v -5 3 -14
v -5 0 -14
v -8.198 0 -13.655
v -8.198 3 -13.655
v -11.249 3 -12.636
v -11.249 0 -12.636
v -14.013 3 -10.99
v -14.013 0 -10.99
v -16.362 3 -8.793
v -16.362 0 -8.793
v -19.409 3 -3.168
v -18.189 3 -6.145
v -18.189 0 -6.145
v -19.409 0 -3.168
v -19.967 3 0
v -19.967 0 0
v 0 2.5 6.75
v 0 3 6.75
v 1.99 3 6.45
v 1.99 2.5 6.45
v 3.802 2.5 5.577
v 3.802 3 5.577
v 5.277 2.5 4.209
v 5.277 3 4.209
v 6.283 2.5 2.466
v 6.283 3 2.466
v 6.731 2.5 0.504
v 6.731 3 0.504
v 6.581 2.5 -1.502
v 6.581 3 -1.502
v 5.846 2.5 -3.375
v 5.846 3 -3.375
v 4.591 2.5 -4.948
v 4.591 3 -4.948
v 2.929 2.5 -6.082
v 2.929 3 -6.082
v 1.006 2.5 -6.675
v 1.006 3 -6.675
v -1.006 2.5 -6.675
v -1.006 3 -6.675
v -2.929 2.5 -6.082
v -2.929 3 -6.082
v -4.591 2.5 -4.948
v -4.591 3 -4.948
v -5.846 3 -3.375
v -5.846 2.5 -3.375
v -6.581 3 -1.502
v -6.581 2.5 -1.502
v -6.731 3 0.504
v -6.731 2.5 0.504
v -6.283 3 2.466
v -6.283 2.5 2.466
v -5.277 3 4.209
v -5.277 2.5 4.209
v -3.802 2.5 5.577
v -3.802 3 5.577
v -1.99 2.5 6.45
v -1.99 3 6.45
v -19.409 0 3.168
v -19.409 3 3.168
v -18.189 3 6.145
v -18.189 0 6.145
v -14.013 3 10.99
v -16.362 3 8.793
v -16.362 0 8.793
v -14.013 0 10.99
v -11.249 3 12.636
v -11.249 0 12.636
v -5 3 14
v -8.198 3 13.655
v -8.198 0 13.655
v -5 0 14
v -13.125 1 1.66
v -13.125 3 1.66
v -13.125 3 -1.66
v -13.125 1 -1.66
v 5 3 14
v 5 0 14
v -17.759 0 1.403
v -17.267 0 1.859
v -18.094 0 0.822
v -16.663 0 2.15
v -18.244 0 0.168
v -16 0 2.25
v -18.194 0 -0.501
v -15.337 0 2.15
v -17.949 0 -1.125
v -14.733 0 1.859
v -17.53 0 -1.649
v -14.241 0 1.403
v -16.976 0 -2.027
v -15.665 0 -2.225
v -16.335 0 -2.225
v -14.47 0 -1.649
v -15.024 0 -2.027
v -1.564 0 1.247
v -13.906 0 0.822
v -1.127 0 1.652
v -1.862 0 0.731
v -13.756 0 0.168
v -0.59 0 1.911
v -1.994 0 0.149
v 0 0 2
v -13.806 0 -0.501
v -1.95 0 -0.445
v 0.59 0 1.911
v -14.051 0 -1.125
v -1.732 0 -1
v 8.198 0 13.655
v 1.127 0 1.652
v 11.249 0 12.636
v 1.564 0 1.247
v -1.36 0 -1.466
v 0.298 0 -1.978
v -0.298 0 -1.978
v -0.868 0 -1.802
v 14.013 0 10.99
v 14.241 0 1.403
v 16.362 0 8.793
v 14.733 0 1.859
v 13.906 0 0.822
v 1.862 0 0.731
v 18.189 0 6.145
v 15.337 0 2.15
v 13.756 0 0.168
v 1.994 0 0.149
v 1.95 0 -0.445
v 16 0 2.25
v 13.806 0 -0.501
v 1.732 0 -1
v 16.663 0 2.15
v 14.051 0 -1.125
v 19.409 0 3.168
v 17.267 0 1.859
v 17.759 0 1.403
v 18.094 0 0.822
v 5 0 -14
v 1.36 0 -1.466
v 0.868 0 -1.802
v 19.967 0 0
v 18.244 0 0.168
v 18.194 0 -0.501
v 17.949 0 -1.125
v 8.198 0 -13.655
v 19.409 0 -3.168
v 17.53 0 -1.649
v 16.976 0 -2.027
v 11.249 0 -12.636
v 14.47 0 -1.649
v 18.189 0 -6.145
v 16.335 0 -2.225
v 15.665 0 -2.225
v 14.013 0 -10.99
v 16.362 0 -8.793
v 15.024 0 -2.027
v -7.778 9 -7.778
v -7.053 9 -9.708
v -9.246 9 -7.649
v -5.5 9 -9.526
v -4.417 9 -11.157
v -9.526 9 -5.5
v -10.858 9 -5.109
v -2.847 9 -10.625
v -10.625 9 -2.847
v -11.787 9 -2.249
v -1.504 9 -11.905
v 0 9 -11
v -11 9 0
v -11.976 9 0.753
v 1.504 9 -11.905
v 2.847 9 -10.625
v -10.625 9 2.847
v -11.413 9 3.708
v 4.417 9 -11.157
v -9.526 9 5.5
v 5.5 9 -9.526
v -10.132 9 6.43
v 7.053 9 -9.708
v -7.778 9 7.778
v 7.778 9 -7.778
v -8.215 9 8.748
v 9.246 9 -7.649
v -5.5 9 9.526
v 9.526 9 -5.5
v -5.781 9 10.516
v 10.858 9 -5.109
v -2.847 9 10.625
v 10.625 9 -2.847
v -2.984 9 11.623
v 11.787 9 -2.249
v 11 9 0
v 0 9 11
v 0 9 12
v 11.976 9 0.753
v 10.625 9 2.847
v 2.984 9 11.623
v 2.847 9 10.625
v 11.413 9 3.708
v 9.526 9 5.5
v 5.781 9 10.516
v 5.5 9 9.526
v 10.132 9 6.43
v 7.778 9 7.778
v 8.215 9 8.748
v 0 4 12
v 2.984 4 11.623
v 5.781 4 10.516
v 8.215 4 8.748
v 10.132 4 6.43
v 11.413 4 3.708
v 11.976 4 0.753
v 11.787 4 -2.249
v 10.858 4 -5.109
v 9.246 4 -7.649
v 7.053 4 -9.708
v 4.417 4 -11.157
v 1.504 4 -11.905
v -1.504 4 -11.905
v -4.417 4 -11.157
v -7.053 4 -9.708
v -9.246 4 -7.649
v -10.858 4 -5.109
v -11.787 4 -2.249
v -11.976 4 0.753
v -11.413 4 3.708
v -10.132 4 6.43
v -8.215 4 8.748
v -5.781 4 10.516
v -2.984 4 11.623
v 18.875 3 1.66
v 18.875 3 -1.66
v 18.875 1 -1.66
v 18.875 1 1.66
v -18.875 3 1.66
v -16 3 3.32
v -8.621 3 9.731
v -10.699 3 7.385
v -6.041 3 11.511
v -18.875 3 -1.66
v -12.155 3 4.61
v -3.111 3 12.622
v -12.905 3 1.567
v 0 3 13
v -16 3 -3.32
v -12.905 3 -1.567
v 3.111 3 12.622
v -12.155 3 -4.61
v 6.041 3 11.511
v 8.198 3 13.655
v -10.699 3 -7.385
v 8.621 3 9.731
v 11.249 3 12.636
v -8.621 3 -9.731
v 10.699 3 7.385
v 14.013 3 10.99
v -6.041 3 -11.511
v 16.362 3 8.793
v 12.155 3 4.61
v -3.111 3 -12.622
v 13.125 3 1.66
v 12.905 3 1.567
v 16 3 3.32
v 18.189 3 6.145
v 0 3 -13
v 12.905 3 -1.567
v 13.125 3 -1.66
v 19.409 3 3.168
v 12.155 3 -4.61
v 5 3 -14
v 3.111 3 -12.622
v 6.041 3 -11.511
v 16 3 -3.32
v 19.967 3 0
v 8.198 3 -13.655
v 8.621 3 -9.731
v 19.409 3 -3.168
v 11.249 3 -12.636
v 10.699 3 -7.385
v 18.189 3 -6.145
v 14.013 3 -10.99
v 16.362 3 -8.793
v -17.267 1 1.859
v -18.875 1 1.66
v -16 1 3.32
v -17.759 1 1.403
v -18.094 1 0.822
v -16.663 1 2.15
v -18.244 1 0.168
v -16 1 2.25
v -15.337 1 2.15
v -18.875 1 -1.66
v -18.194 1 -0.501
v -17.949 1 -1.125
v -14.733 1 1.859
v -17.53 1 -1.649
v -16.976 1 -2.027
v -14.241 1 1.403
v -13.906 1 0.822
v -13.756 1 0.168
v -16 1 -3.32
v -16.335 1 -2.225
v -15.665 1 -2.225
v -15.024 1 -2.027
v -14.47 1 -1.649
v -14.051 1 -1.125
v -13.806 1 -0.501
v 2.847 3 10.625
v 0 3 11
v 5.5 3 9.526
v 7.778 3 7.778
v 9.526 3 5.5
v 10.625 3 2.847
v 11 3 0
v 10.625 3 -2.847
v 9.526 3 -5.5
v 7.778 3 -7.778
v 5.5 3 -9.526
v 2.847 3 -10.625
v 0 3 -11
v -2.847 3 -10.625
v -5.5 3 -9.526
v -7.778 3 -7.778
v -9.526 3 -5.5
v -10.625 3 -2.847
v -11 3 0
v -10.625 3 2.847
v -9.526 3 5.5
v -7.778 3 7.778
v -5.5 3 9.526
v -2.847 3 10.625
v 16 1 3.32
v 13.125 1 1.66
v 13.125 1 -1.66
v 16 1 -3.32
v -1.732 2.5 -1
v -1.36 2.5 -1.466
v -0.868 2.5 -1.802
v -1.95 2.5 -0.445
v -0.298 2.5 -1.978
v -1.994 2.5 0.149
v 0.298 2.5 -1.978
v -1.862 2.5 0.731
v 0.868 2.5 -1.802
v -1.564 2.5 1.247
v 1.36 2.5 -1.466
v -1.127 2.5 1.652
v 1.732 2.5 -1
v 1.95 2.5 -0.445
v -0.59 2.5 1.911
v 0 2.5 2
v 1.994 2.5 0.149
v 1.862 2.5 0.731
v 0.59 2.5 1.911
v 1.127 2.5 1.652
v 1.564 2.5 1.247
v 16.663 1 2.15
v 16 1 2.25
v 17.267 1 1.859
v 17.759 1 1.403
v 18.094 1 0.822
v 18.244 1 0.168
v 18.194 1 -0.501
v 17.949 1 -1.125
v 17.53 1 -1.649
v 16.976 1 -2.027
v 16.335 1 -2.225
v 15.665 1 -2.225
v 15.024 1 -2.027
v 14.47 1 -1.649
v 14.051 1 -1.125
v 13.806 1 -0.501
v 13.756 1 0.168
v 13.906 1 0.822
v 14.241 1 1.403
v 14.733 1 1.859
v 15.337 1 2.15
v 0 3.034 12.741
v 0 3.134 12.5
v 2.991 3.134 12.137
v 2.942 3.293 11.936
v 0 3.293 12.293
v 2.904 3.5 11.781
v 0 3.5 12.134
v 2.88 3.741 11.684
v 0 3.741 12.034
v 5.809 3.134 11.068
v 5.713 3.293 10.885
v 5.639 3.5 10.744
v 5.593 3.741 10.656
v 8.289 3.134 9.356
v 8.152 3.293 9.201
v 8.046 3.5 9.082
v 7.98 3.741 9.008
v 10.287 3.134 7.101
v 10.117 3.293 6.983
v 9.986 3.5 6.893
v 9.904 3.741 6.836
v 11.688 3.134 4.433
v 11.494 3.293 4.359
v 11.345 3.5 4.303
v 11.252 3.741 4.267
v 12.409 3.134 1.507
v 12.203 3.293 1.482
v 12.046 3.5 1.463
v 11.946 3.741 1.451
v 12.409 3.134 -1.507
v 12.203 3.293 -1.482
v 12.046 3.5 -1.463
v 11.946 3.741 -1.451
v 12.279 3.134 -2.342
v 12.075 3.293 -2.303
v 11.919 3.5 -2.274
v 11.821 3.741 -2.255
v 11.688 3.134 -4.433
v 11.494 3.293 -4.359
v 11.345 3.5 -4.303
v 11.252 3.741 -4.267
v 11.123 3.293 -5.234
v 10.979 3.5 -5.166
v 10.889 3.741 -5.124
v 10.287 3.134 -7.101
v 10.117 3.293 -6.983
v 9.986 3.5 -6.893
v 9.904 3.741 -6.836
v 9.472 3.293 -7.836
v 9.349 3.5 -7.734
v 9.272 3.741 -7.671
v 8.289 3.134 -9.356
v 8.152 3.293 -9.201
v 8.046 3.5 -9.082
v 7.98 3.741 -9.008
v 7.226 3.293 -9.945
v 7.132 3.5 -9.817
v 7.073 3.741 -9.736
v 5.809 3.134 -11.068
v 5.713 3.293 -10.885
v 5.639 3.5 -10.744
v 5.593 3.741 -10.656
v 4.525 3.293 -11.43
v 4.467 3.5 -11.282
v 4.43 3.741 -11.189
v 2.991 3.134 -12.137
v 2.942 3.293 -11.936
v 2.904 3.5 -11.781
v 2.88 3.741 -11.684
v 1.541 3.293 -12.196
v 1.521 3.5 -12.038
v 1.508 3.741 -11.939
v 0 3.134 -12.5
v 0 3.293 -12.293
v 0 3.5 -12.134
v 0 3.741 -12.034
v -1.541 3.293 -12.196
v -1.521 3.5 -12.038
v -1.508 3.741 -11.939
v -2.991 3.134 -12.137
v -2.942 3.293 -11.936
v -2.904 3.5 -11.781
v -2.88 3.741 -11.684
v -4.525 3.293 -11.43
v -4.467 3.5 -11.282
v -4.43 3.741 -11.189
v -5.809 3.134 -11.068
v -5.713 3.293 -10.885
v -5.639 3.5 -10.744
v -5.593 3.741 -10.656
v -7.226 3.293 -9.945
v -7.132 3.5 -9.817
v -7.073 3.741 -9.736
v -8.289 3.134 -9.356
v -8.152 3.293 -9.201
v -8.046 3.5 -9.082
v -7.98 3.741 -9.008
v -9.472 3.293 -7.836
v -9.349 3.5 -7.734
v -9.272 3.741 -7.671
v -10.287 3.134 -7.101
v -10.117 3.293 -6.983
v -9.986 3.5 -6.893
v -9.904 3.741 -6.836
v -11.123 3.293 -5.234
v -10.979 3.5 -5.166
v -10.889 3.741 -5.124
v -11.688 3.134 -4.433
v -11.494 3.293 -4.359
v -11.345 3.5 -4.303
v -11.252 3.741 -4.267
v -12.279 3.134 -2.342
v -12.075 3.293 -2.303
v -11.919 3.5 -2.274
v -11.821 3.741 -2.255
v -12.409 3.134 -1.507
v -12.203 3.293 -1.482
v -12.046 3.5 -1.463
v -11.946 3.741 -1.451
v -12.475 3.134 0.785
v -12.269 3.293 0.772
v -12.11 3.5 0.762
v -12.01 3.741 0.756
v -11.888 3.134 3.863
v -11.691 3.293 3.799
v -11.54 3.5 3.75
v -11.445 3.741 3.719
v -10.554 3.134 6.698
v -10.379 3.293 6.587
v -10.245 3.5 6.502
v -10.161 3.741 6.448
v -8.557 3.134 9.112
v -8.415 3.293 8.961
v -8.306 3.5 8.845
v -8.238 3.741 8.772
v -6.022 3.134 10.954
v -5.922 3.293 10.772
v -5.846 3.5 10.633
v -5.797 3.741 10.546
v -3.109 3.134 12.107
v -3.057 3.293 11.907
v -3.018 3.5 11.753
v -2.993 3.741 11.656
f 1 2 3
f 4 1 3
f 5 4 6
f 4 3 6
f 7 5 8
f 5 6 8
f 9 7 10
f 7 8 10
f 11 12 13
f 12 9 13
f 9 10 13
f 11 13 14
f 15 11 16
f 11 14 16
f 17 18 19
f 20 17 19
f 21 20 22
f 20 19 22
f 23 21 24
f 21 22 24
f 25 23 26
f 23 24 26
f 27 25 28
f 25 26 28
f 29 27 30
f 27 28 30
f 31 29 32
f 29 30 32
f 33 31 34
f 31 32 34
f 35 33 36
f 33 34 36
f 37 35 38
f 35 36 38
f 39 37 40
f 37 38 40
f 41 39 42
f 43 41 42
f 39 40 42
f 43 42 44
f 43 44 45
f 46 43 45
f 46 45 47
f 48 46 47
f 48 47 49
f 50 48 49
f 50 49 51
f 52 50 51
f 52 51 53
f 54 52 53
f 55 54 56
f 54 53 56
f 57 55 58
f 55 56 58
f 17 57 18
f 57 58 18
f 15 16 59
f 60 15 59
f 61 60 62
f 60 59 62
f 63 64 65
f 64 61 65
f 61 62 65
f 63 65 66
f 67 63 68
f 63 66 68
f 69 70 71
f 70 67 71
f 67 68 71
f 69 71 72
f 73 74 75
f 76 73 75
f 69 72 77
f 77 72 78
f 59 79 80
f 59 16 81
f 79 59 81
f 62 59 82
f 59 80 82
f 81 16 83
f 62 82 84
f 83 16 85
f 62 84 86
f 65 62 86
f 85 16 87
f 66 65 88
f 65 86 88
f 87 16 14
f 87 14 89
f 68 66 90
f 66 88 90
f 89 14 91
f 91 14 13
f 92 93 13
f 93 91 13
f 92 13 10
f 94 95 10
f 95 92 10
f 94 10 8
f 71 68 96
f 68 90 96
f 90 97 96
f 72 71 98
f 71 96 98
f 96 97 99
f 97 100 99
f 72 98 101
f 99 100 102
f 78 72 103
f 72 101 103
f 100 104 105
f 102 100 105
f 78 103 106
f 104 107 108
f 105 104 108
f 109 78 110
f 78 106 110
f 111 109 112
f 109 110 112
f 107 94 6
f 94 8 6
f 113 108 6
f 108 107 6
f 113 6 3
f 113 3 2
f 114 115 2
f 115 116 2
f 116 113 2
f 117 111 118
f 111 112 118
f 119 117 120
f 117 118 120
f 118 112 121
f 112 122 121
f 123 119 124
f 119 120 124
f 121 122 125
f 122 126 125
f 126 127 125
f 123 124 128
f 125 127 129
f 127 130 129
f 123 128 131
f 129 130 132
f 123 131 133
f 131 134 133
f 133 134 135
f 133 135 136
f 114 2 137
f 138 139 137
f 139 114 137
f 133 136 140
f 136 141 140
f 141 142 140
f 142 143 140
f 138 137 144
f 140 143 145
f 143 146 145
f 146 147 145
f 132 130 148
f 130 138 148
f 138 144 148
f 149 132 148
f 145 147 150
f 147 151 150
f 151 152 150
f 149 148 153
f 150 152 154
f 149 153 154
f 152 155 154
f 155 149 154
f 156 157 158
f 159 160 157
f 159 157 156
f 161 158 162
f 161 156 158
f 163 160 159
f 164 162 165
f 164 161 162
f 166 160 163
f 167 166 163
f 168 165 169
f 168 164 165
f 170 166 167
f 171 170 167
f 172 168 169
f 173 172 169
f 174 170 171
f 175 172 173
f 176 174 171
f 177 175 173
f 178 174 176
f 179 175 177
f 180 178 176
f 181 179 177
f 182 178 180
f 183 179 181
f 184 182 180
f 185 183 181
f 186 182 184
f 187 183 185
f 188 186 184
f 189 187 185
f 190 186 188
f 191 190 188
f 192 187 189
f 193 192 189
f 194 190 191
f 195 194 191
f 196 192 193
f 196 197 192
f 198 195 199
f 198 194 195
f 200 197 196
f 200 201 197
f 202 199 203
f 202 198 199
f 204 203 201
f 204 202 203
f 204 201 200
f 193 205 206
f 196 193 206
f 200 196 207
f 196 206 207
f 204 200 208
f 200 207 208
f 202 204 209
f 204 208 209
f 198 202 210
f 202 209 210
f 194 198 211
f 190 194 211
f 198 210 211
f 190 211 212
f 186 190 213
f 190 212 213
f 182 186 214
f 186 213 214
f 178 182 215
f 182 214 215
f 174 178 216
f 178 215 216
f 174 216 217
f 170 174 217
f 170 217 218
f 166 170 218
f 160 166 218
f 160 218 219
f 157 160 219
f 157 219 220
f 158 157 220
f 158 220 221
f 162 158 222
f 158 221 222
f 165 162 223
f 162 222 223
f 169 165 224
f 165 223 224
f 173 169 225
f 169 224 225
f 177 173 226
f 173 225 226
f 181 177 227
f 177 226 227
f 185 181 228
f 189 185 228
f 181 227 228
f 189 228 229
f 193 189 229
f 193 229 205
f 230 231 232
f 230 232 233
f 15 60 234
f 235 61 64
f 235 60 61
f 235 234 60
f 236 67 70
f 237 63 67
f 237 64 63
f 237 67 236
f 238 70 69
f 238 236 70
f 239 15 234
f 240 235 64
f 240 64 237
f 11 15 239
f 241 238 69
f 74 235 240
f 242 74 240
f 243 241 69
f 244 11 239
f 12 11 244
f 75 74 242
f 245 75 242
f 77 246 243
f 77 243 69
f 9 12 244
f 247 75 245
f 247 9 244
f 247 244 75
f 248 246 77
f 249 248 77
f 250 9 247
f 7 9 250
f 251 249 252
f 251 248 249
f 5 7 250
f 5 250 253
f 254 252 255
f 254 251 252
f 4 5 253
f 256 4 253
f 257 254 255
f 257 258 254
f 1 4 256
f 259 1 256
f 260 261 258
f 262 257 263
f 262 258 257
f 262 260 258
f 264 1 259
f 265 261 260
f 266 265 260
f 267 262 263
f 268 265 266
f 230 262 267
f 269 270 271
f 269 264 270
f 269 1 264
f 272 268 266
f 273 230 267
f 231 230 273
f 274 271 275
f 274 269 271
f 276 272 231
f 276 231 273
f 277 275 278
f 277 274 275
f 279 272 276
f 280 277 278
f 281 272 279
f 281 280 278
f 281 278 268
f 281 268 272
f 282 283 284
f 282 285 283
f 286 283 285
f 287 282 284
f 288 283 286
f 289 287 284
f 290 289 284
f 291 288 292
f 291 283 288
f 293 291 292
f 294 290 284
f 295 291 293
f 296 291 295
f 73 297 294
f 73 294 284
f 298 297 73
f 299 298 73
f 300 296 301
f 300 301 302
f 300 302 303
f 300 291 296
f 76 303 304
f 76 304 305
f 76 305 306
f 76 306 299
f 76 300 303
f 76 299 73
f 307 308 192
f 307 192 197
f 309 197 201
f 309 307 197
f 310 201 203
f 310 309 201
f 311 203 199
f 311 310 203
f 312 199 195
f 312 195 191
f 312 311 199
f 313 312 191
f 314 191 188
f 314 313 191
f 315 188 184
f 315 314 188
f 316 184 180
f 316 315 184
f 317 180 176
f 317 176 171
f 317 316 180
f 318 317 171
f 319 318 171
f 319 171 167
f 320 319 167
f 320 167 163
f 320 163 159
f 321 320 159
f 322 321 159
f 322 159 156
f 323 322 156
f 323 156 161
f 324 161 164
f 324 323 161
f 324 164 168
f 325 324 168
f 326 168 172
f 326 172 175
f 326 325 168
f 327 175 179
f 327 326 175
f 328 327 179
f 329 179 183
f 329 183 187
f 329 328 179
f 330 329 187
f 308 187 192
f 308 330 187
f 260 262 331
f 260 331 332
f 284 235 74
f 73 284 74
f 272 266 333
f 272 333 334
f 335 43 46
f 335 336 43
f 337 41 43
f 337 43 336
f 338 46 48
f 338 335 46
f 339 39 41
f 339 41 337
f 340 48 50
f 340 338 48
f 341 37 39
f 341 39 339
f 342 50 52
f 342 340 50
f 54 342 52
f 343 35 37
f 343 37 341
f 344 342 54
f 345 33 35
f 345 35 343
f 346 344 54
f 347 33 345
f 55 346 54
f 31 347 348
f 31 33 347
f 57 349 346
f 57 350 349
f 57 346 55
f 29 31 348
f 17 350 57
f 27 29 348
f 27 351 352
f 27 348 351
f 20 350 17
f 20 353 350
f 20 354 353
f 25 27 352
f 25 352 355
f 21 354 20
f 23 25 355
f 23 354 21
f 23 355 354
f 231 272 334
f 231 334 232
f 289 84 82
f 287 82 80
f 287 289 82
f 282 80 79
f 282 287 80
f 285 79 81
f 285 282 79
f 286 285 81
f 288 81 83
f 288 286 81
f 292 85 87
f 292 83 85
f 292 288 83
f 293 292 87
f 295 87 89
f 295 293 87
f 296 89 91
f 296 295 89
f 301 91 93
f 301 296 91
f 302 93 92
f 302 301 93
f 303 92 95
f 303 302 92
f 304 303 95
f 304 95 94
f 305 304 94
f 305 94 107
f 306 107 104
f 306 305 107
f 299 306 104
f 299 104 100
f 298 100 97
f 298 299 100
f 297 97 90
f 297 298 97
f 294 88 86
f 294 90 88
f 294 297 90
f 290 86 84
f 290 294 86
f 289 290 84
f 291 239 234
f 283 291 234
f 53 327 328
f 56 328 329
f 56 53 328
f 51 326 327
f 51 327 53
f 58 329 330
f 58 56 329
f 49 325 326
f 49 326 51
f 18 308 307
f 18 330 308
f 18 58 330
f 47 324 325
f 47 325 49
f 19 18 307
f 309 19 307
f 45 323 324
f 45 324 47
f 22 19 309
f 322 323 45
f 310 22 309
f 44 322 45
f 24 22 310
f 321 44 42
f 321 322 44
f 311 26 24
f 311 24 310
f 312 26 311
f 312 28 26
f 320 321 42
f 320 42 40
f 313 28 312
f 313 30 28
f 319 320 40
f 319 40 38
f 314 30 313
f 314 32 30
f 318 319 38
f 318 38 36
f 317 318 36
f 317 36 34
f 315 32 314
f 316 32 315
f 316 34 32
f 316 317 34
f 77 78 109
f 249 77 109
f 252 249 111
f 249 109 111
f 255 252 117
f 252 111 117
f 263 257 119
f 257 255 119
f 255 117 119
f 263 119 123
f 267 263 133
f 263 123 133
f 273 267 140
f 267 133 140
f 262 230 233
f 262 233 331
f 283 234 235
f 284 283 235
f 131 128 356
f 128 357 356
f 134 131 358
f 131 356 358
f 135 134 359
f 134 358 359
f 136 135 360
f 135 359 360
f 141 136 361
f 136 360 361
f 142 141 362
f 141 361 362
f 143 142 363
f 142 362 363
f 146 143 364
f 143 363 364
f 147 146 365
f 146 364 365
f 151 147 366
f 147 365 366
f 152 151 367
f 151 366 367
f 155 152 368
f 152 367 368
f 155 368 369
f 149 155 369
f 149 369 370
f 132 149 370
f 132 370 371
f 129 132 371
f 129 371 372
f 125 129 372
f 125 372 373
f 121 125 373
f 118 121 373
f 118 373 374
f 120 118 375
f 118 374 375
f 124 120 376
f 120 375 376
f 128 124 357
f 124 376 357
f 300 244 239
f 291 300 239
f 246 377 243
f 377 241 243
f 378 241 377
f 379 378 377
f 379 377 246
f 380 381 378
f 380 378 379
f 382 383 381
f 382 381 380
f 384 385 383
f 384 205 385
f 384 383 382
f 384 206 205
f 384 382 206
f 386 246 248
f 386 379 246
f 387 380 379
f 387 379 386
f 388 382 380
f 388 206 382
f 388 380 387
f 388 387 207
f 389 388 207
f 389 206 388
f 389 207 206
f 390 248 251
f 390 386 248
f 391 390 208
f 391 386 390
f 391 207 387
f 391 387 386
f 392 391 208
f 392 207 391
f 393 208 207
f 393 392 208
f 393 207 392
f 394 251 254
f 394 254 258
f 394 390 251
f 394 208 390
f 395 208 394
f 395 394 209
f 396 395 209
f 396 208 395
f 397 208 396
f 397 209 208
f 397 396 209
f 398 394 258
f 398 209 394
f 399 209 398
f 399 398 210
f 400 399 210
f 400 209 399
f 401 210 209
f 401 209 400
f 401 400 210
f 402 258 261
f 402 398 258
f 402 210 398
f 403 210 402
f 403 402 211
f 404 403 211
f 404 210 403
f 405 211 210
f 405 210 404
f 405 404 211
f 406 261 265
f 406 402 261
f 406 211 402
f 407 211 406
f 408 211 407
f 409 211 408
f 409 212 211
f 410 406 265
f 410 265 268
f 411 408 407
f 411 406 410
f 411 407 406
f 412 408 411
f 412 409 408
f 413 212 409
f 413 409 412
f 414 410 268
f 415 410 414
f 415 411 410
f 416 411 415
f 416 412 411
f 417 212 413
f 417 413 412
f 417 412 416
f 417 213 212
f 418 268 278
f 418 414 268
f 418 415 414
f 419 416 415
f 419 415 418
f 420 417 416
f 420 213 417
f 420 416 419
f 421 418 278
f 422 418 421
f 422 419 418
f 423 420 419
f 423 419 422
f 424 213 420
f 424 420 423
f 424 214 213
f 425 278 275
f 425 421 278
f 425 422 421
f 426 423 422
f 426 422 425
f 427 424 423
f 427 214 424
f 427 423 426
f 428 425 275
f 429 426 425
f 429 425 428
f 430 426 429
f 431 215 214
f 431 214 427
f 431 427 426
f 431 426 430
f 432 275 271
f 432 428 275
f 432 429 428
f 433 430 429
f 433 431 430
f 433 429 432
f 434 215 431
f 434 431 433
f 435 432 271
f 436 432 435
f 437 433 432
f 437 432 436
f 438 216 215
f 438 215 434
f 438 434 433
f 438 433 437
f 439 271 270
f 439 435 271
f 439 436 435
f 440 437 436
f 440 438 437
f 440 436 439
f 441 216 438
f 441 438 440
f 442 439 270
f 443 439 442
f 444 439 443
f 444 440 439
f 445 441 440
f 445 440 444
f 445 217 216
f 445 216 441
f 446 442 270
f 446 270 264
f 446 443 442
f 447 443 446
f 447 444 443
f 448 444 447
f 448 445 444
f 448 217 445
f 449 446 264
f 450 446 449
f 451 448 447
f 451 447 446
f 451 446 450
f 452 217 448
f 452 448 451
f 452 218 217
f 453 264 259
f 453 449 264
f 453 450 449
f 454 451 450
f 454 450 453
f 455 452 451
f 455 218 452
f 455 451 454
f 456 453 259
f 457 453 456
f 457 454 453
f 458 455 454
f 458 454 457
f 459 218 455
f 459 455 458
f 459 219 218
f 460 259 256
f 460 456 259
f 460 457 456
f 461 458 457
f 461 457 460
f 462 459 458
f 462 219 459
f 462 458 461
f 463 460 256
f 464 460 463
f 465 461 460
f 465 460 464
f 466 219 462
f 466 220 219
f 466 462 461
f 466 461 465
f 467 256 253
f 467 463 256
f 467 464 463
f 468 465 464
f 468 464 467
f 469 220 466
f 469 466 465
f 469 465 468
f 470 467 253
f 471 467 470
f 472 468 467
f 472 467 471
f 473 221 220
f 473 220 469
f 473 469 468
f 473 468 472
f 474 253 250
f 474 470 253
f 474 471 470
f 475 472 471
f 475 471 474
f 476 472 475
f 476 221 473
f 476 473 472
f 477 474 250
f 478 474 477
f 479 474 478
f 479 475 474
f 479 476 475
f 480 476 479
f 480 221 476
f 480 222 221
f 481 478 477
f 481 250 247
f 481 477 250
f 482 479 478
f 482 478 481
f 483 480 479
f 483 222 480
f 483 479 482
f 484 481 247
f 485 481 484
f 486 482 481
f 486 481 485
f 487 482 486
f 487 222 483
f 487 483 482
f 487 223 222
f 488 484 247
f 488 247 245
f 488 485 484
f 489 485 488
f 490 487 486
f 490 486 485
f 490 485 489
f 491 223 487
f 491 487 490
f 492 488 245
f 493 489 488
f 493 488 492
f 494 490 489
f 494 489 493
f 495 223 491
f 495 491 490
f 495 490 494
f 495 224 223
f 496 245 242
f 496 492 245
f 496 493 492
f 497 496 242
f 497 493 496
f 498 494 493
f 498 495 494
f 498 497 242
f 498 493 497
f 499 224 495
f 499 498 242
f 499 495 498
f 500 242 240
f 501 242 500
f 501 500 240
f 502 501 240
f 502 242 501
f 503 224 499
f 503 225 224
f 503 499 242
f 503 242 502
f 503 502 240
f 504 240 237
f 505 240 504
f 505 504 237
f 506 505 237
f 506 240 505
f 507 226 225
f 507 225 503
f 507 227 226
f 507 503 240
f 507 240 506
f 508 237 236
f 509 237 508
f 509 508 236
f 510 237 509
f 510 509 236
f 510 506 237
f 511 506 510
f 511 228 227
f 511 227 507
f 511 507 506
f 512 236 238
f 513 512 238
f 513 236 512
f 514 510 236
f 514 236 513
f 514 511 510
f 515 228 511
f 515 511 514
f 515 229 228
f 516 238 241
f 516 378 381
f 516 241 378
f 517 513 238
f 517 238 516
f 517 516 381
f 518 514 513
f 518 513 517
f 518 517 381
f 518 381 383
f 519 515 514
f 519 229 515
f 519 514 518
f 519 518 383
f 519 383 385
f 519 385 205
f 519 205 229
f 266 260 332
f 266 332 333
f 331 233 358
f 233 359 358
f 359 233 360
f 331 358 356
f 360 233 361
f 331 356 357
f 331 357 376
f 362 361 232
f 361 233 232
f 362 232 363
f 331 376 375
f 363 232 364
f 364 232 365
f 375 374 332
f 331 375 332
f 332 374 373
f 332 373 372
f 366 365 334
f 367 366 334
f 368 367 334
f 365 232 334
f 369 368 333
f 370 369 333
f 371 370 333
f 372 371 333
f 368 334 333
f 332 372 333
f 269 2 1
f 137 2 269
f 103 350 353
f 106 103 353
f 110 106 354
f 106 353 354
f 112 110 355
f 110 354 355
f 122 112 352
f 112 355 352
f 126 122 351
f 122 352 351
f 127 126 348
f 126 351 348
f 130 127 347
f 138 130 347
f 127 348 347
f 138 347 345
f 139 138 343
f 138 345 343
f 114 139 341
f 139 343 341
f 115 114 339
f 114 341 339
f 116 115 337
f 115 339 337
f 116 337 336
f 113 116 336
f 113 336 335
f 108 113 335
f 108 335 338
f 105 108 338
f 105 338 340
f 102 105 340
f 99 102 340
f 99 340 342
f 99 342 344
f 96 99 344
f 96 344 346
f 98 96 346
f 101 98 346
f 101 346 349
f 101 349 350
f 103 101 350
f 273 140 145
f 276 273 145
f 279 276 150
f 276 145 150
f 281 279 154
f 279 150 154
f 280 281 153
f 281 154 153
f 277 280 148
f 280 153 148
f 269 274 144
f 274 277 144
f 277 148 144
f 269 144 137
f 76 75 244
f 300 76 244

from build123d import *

# Parameters (mm, degrees)
SKETCH2_W           = 40
SKETCH2_H           = 28
BOSS_EXTRUDE1_DEPTH = 3
SKETCH3_R           = 12
SKETCH3_R_2         = 11
BOSS_EXTRUDE2_DEPTH = 6
CUT_EXTRUDE1_DEPTH  = 2
FILLET1_R           = 1
FILLET2_R           = 15
SKETCH8_R           = 6.75
CUT_EXTRUDE2_DEPTH  = 0.5
SKETCH9_R           = 2
CUT_EXTRUDE3_DEPTH  = 26.237200627


with BuildPart() as part:
    # Sketch2 → Boss-Extrude1 (new body)
    with BuildSketch(Plane(origin=(0, 0, 0), x_dir=(1, 0, 0), z_dir=(0, 1, 0))):
        Rectangle(SKETCH2_W, SKETCH2_H)
    extrude(amount=BOSS_EXTRUDE1_DEPTH)

    # Sketch3 → Boss-Extrude2 (add)
    with BuildSketch(Plane(origin=(0, 3, 0), x_dir=(1, 0, 0), z_dir=(0, 1, 0))):
        with Locations(Location((0, 0, 0), (0, 0, 270))):
            Circle(SKETCH3_R)
        with Locations(Location((0, 0, 0), (0, 0, 270))):
            Circle(SKETCH3_R_2, mode=Mode.SUBTRACT)
    extrude(amount=BOSS_EXTRUDE2_DEPTH)

    # Sketch4 → Cut-Extrude1 (cut)
    with BuildSketch(Plane(origin=(0, 3, 0), x_dir=(1, 0, 0), z_dir=(0, 1, 0))):
        Polygon((-16, 3.319764048), (-18.875, 1.659882024), (-18.875, -1.659882024), (-16, -3.319764048), (-13.125, -1.659882024), (-13.125, 1.659882024), align=None)
    cut_extrude1 = extrude(amount=-CUT_EXTRUDE1_DEPTH, mode=Mode.SUBTRACT)

    # Sketch6 → M4 Clearance Hole1 (revolve, cut)
    with BuildSketch(Plane(origin=(-16, 1, 0), x_dir=(0, 0, 1), z_dir=(1, 0, 0))):
        Polygon((0, 0), (0, 3.351936393), (2.25, 2), (2.25, 0), align=None)
    m4_clearance_hole1 = revolve(axis=Axis((-16, 7.35, 0), (0, -1, 0)), mode=Mode.SUBTRACT)

    # Mirror1: Cut-Extrude1, M4 Clearance Hole1 across plane
    add(cut_extrude1.mirror(Plane(origin=(0, 0, 0), x_dir=(0, 0, 1), z_dir=(1, 0, 0))), mode=Mode.SUBTRACT)
    add(m4_clearance_hole1.mirror(Plane(origin=(0, 0, 0), x_dir=(0, 0, 1), z_dir=(1, 0, 0))), mode=Mode.SUBTRACT)

    # Fillet1
    fillet1_edges = [part.edges().sort_by_distance(p)[0] for p in [
        (0, 3, -12),
    ]]
    fillet(fillet1_edges, radius=FILLET1_R)

    # Fillet2
    # the kernel refuses this fillet: 15 mm, written as the material it takes off along each edge
    with BuildSketch(Plane(origin=(-20, -37.5, -14), x_dir=(1, 0, 0), z_dir=(0, 1, 0)), Plane(origin=(-20, -37.5, 14), x_dir=(0, 0, -1), z_dir=(0, 1, 0))) as fillet2_piece_1:
        with BuildLine():
            CenterArc((FILLET2_R, -FILLET2_R), FILLET2_R, 90, 90)
            Line((0, -FILLET2_R), (0, 0))
            Line((0, 0), (FILLET2_R, 0))
        make_face()
    extrude(amount=78, mode=Mode.SUBTRACT)
    with BuildSketch(Plane(origin=(20, -37.5, 14), x_dir=(0, 0, -1), z_dir=(0, 1, 0)), Plane(origin=(20, -37.5, -14), x_dir=(-1, 0, 0), z_dir=(0, 1, 0))) as fillet2_piece_2:
        with BuildLine():
            CenterArc((FILLET2_R, FILLET2_R), FILLET2_R, 180, 90)
            Line((0, FILLET2_R), (0, 0))
            Line((0, 0), (FILLET2_R, 0))
        make_face()
    extrude(amount=78, mode=Mode.SUBTRACT)

    # Sketch8 → Cut-Extrude2 (cut)
    with BuildSketch(Plane(origin=(0, 3, 0), x_dir=(1, 0, 0), z_dir=(0, 1, 0))):
        with Locations(Location((0, 0, 0), (0, 0, 270))):
            Circle(SKETCH8_R)
    extrude(amount=-CUT_EXTRUDE2_DEPTH, mode=Mode.SUBTRACT)

    # Sketch9 → Cut-Extrude3 (cut, through all)
    with BuildSketch(Plane(origin=(0, 2.5, 0), x_dir=(1, 0, 0), z_dir=(0, 1, 0))):
        with Locations(Location((0, 0, 0), (0, 0, 270))):
            Circle(SKETCH9_R)
    extrude(amount=-CUT_EXTRUDE3_DEPTH, mode=Mode.SUBTRACT)


solid = part.part
